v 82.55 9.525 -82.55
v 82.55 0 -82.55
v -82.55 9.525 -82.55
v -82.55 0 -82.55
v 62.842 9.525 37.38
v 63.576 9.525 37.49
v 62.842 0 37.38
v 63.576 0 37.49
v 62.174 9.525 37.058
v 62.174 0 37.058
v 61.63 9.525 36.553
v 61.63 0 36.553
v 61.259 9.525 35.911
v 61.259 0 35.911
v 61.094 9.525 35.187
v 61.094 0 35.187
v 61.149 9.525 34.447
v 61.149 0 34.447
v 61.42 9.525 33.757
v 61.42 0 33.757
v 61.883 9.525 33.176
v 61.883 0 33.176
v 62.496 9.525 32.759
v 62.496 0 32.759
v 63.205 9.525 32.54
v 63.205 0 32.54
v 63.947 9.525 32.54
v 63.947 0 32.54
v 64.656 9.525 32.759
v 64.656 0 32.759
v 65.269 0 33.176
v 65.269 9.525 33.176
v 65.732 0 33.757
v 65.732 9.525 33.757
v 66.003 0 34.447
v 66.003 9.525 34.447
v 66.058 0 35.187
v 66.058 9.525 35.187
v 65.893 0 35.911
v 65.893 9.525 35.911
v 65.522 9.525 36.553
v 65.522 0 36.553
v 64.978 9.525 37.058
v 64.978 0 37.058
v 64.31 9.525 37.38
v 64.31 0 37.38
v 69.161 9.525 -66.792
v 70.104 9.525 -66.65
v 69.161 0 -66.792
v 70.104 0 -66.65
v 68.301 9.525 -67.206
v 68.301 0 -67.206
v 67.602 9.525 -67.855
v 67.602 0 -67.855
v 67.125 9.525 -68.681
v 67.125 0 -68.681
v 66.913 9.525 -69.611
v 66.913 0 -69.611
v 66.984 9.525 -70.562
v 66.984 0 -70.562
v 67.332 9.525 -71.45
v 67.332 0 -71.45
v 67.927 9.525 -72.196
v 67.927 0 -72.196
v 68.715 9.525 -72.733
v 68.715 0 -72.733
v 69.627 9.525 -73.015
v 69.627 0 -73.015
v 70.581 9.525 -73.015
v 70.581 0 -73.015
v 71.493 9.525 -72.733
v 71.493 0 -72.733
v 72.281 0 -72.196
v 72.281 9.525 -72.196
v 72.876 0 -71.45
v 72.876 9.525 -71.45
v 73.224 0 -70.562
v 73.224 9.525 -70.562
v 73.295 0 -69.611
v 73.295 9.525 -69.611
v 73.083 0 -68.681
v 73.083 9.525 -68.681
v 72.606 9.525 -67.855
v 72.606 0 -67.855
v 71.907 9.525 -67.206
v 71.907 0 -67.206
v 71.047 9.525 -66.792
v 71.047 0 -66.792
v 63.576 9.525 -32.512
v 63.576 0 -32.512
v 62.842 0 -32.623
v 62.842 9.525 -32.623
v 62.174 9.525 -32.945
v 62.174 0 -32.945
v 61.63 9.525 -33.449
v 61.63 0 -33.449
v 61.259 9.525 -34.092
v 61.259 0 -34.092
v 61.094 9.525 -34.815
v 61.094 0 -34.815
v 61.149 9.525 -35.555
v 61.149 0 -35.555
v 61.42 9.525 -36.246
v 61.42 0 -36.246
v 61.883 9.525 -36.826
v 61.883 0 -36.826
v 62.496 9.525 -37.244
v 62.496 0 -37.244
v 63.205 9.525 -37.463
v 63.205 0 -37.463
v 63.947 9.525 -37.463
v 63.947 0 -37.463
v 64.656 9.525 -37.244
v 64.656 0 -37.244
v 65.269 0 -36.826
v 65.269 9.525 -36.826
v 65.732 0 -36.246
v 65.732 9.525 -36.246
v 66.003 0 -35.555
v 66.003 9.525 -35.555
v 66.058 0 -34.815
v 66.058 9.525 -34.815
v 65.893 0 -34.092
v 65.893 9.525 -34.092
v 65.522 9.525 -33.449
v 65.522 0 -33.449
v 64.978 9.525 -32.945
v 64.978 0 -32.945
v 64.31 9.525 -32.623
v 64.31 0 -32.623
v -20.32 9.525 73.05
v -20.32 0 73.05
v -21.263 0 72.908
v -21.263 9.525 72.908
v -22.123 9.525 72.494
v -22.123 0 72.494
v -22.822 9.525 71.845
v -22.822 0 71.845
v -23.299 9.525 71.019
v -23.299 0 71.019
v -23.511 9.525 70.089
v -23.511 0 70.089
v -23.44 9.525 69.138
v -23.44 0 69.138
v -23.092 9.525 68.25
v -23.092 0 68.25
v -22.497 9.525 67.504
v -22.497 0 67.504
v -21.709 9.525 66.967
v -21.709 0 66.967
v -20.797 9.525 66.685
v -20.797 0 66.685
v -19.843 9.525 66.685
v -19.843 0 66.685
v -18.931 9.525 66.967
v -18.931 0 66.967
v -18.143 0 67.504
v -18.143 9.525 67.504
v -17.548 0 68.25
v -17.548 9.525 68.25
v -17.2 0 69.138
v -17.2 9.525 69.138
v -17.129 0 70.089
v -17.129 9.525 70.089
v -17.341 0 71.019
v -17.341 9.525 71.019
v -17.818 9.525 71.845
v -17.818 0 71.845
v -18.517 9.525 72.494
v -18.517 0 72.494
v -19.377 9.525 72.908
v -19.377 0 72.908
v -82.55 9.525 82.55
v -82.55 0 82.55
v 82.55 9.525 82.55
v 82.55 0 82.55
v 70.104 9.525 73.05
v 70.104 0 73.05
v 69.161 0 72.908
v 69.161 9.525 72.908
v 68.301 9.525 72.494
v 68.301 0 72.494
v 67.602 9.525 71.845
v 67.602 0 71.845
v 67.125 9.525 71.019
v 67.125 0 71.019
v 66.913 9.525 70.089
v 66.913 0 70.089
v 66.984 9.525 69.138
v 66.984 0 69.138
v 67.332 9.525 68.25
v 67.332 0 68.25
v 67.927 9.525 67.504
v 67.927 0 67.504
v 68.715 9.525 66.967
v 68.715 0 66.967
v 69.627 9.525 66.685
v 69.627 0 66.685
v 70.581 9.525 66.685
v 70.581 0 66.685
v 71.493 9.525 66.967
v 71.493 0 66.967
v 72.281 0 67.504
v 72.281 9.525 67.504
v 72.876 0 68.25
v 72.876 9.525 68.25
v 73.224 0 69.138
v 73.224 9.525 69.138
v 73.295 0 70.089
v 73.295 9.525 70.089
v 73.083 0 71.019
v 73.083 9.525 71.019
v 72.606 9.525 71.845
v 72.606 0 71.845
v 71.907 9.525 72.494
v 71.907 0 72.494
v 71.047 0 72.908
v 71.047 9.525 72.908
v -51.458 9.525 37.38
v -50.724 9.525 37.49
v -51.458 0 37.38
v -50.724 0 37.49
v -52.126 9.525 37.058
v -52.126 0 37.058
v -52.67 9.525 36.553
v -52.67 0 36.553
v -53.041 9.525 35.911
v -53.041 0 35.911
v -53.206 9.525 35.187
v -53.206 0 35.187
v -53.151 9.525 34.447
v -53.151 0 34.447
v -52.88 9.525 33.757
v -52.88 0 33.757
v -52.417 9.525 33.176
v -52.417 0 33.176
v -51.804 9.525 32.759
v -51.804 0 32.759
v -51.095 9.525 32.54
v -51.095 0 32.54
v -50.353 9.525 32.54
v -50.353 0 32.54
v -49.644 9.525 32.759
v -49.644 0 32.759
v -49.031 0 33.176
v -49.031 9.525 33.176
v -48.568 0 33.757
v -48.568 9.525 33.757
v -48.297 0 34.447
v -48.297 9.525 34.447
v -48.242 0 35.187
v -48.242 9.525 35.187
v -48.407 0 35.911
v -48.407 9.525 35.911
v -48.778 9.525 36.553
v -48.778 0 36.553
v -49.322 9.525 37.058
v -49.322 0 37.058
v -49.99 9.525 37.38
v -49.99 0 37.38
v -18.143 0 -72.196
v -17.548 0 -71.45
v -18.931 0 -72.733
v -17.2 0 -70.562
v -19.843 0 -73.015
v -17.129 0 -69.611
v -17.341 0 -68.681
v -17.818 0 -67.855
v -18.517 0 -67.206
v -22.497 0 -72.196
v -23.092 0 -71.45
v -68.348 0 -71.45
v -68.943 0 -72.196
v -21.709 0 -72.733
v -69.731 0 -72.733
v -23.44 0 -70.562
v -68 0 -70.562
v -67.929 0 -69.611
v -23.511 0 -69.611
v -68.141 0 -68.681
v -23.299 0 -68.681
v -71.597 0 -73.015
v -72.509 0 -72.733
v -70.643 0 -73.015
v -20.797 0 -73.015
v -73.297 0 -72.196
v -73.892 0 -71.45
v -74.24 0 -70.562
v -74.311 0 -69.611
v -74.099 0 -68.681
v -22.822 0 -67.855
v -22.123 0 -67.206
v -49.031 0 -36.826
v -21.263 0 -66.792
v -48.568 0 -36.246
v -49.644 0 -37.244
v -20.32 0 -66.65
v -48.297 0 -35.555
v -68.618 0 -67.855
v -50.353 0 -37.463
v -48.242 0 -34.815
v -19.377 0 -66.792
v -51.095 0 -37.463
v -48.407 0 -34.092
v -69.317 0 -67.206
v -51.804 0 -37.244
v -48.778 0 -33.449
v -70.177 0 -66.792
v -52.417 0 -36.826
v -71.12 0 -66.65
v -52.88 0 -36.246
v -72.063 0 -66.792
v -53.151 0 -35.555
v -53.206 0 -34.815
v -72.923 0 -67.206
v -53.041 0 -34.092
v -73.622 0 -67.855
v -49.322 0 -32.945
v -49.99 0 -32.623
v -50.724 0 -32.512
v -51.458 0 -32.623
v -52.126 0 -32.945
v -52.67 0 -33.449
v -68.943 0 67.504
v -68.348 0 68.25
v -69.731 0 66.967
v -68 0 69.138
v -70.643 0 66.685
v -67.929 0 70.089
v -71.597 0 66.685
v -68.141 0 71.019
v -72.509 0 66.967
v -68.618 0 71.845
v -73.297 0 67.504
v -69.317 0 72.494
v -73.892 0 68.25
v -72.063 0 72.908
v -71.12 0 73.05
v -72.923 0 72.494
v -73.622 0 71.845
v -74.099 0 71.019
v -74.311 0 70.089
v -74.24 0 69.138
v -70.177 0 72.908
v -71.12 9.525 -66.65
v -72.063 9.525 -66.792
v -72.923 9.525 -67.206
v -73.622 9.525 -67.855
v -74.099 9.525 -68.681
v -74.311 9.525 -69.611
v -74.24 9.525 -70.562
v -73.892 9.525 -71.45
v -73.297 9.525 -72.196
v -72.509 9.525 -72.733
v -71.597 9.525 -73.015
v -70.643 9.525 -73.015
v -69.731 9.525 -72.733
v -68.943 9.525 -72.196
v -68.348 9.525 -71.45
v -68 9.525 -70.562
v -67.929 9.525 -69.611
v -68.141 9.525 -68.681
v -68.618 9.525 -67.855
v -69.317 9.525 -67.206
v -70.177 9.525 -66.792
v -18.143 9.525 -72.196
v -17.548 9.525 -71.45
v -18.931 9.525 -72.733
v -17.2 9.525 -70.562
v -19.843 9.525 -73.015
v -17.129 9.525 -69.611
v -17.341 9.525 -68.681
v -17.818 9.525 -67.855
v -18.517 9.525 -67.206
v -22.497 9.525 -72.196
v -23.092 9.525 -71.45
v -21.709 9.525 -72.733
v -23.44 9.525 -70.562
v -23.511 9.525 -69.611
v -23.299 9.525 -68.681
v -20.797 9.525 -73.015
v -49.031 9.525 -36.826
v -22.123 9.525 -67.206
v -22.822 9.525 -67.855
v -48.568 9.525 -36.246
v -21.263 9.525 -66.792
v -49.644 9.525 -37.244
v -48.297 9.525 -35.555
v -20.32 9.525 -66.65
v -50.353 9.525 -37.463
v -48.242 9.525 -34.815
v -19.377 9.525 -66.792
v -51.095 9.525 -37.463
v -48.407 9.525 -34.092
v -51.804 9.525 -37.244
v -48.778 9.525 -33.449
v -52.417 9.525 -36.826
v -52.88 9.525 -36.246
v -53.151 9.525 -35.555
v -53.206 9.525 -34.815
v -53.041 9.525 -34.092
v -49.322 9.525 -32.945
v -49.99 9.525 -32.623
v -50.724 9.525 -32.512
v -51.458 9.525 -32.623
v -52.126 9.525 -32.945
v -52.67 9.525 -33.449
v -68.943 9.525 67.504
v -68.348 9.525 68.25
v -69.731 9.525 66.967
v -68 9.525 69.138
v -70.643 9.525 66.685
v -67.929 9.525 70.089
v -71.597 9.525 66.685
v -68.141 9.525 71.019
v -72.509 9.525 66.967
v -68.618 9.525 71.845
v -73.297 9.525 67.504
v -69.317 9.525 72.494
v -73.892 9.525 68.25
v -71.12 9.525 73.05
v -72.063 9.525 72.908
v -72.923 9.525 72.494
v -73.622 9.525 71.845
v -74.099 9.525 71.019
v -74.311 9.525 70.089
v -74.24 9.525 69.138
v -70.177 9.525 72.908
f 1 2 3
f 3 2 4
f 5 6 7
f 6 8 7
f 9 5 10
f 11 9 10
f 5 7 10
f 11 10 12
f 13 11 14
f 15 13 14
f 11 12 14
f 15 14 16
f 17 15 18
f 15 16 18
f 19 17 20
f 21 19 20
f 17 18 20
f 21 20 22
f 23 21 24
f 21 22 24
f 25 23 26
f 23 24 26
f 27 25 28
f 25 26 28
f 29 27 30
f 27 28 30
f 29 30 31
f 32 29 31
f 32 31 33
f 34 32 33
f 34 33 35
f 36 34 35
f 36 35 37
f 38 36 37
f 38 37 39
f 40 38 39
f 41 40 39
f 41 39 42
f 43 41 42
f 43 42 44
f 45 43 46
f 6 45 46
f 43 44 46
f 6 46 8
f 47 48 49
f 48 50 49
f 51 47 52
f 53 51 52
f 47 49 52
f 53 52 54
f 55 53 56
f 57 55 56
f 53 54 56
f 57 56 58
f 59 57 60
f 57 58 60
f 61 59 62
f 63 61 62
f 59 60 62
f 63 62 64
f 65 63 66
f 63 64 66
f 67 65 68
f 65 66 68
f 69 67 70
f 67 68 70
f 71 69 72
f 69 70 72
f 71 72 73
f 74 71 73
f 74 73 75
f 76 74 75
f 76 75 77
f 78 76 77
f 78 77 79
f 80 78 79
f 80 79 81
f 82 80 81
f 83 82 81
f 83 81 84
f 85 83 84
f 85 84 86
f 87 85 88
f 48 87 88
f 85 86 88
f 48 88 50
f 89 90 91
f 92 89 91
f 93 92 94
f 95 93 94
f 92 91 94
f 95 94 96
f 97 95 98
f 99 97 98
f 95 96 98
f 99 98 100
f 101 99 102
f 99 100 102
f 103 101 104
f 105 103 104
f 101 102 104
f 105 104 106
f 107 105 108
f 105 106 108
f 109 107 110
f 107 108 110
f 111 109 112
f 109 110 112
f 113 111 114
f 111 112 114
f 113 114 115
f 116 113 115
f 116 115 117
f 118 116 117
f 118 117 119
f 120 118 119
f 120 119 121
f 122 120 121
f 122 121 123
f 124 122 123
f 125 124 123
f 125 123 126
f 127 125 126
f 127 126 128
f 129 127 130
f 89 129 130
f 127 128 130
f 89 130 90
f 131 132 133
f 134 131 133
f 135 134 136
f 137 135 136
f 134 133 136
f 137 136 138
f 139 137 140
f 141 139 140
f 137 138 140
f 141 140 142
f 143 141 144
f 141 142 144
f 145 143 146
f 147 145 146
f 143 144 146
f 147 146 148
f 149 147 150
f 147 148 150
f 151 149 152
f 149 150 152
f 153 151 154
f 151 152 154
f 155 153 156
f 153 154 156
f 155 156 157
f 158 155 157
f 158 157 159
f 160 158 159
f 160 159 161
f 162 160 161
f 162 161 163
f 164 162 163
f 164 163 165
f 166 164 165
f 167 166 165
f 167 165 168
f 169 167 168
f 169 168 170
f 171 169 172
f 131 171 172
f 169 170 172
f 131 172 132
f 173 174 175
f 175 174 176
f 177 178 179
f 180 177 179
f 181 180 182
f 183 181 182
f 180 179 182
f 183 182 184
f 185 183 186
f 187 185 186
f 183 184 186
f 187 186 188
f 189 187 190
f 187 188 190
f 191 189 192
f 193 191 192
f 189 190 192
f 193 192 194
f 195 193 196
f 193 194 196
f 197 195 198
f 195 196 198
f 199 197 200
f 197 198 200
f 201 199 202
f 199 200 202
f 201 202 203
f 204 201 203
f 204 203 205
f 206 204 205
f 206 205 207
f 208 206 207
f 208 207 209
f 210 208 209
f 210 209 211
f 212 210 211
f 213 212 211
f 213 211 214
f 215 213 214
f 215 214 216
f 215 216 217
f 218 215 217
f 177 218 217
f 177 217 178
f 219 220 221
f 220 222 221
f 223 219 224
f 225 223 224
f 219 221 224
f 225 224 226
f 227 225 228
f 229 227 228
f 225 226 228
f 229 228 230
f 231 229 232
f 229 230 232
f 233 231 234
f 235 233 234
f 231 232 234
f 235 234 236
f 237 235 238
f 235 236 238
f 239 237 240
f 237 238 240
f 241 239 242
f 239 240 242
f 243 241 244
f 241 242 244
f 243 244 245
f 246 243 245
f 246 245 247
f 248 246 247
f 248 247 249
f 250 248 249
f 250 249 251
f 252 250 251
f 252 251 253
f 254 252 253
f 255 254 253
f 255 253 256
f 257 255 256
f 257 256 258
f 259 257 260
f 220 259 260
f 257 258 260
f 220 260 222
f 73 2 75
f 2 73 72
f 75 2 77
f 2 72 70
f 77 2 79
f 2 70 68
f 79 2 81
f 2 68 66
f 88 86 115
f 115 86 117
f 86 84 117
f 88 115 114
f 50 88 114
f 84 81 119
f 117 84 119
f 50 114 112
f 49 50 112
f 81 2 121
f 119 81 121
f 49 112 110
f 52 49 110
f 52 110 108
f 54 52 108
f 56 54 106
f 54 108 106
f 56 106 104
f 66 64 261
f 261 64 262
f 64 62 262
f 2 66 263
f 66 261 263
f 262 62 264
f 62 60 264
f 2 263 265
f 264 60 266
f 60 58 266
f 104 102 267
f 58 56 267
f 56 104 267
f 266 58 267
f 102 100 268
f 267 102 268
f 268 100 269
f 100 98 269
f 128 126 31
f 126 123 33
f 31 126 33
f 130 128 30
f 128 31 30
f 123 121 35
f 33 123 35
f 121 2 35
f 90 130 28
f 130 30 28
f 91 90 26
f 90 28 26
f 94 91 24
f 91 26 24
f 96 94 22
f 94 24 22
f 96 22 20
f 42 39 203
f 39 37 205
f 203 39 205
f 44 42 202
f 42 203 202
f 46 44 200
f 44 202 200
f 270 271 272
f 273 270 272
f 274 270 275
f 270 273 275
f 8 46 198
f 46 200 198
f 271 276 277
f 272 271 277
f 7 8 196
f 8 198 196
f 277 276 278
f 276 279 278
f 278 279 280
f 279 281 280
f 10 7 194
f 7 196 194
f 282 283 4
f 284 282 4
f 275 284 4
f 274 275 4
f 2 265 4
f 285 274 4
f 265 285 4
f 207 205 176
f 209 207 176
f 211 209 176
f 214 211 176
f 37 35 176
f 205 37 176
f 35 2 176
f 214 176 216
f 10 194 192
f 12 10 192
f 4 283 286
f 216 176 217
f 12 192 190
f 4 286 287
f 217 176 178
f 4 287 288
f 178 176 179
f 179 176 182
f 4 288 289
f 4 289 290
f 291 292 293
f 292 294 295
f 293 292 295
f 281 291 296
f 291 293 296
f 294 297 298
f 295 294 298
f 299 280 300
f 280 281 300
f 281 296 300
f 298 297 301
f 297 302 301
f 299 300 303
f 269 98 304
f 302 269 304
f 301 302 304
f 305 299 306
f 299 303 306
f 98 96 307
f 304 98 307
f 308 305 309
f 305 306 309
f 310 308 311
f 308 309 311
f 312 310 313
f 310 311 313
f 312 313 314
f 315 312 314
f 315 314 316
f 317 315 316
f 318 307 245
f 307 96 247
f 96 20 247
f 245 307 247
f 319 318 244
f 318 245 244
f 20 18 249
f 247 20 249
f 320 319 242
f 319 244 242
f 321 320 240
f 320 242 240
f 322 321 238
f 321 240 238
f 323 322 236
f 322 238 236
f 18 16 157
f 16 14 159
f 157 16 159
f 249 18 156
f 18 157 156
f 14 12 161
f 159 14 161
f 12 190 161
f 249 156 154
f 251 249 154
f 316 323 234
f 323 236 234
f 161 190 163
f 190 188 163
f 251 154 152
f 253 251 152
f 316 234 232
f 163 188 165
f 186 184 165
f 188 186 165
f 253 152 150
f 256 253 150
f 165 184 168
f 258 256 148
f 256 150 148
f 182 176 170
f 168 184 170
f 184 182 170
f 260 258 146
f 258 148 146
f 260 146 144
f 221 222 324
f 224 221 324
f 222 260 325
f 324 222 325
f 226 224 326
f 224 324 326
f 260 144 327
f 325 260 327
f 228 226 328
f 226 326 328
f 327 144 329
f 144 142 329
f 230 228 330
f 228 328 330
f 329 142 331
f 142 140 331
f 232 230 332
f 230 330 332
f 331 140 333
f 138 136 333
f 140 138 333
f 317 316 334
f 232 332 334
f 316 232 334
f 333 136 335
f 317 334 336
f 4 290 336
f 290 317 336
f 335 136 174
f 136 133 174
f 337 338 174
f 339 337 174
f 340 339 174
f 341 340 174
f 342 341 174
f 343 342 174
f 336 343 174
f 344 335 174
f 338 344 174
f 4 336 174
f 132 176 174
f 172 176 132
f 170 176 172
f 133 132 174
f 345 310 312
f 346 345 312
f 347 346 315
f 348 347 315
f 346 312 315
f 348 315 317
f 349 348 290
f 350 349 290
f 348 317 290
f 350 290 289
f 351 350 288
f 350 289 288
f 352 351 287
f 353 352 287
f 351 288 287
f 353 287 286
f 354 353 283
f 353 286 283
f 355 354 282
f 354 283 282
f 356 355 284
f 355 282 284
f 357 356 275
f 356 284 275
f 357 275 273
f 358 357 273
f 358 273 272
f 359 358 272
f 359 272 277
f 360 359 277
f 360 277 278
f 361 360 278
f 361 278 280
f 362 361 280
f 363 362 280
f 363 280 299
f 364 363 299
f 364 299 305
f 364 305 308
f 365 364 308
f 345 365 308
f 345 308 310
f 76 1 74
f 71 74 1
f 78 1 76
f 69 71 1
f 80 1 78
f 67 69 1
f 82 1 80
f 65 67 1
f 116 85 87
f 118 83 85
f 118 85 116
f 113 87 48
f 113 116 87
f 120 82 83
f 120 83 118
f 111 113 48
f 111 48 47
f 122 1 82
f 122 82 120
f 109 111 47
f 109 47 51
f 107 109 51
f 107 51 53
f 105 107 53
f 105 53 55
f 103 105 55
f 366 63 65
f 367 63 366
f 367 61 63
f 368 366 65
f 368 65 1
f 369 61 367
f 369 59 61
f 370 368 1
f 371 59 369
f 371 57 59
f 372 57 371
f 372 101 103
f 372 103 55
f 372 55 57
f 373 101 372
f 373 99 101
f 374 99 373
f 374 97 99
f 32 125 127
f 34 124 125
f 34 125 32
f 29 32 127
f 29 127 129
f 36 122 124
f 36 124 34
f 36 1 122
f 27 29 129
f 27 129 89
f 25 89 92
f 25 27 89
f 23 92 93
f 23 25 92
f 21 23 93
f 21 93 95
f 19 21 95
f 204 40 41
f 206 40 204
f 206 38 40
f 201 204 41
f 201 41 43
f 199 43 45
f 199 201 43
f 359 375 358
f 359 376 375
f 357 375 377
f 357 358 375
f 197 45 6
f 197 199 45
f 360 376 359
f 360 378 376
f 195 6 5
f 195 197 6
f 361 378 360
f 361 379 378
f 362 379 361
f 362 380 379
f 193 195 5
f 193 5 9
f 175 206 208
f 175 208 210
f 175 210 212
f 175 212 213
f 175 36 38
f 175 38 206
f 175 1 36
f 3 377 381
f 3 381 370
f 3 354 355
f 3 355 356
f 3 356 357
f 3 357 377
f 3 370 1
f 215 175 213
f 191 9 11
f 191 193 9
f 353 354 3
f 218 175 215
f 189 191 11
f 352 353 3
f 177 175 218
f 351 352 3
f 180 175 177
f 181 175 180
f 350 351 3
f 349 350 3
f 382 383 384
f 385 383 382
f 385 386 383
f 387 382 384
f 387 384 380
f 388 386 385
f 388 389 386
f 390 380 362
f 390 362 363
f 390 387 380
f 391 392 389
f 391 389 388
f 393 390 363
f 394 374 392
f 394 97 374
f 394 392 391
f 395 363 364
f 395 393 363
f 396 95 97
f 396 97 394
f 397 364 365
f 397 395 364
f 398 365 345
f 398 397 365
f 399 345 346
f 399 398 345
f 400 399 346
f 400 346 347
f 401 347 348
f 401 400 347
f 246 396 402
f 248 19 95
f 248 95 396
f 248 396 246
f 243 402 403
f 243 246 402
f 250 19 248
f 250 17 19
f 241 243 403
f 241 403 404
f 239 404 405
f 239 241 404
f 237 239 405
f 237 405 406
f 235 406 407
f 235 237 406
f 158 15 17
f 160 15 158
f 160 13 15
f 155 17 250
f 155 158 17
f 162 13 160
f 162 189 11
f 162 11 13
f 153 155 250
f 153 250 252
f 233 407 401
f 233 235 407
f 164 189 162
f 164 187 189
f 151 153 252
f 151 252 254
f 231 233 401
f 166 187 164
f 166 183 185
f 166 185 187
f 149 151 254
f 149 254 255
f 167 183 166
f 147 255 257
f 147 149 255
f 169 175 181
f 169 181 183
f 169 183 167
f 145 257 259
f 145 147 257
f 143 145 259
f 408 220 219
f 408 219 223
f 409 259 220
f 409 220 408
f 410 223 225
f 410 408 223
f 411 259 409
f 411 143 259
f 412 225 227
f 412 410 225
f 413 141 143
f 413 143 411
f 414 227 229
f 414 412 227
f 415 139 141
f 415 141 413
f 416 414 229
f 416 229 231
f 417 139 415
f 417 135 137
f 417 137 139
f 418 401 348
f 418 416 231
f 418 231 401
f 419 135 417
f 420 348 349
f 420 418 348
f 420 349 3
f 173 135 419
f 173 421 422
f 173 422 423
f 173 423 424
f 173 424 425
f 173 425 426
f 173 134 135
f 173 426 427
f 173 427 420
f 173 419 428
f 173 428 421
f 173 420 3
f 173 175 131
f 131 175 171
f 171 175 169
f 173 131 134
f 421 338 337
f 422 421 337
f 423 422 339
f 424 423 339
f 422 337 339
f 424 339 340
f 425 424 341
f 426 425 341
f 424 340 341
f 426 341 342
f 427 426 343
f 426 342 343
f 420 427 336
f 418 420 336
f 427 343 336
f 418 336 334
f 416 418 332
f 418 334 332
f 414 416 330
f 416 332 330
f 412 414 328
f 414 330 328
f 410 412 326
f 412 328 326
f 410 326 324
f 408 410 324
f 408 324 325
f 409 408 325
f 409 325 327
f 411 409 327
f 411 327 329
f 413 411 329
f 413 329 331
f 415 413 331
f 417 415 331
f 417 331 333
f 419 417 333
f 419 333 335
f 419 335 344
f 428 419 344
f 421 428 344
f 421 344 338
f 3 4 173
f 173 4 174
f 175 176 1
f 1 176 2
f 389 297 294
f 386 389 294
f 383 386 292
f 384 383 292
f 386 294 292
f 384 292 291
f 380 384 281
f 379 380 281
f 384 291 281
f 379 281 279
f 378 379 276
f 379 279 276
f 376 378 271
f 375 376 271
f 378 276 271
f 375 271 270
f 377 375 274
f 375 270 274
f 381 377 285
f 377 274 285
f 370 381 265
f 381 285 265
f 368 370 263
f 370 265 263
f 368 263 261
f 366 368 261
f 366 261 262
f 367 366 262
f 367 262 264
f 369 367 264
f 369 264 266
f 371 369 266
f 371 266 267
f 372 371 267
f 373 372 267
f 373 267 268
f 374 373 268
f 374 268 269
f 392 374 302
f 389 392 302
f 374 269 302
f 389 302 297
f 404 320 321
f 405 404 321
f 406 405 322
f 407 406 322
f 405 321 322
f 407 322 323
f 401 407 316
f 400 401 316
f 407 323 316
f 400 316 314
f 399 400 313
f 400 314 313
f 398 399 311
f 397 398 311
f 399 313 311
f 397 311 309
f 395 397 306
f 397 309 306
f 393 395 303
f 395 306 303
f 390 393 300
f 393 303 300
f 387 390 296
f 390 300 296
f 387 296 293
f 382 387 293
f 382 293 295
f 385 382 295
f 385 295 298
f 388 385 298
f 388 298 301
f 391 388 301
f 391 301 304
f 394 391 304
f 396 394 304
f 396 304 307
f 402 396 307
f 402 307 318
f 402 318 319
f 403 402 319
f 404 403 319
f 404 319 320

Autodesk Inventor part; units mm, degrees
ref_plane "YZ Plane" through (0, 0, 0) normal (1, 0, 0) x (0, 1, 0)
ref_plane "XZ Plane" through (0, 0, 0) normal (0, 1, 0) x (-1, 0, 0)
ref_plane "XY Plane" through (0, 0, 0) normal (0, 0, 1) x (1, 0, 0)
sketch "Sketch2" plane through (0, 0, 0) normal (0, 1, 0) x (-1, 0, 0)
  line L0 (82.55, 82.55) -> (-82.55, 82.55)
  line L1 (-82.55, 82.55) -> (-82.55, -82.55)
  line L2 (-82.55, -82.55) -> (82.55, -82.55)
  line L3 (82.55, -82.55) -> (82.55, 82.55)
  point P0 (0, 0)
  point P1 (82.55, 0)
  point P2 (0, -82.55)
  dimension "d0" = 165.1
  dimension "d1" = 165.1
extrude "Extrusion1" add sketch "Sketch2" along normal blind 9.525
sketch "Sketch3" plane through (0, 9.525, 0) normal (0, 1, 0) x (1, 0, 0)
  line L0 (-82.55, 82.55) -> (-82.55, -82.55) projected
  line L1 (82.55, 82.55) -> (-82.55, 82.55) projected
  line L2 (115.57, 0) -> (-115.57, 0) projected
  point P0 (0, 0)
  point P1 (-71.12, 69.85)
  point P2 (-20.32, 69.85)
  point P3 (70.104, 69.85)
  point P4 (-71.12, -69.85)
  point P5 (-20.32, -69.85)
  point P6 (70.104, -69.85)
  dimension "d4" = 11.43
  dimension "d5" = 50.8
  dimension "d6" = 90.424
  dimension "d7" = 12.7
hole "Hole1" at (-71.12, 9.525, -69.85) at (-20.32, 9.525, -69.85) at (70.104, 9.525, -69.85) at (-71.12, 9.525, 69.85) at (-20.32, 9.525, 69.85) at (70.104, 9.525, 69.85) direction (0, -1, 0) diameter 6.4008 end through all thread size "5/16-18 UNC" class "2B" standard "ANSI Unified Screw Threads"
sketch "Sketch4" plane through (0, 9.525, 0) normal (0, 1, 0) x (1, 0, 0)
  circle A0 centre (-20.32, -69.85) radius 3.2004 projected
  circle A1 centre (70.104, 69.85) radius 3.2004 projected
  circle A2 centre (-71.12, 69.85) radius 3.2004 projected
  circle A3 centre (-20.32, 69.85) radius 3.2004 projected
  circle A4 centre (-71.12, -69.85) radius 3.2004 projected
  circle A5 centre (70.104, -69.85) radius 3.2004 projected
  line L0 (-82.55, -82.55) -> (82.55, -82.55) projected
  line L1 (82.55, -82.55) -> (82.55, 82.55) projected
  line L2 (82.55, 82.55) -> (-82.55, 82.55) projected
  line L3 (-82.55, 82.55) -> (-82.55, -82.55) projected
  line L4 (-115.57, 0) -> (115.57, 0) projected
  point P0 (0, 0)
  point P1 (-50.7238, 35.0012)
  point P2 (63.5762, 35.0012)
  point P3 (-50.7238, -35.0012)
  point P4 (63.5762, -35.0012)
  dimension "d15" = 31.8262
  dimension "d16" = 114.3
  dimension "d17" = 47.5488
hole "Hole2" at (-50.7238, 9.525, -35.0012) at (63.5762, 9.525, -35.0012) at (-50.7238, 9.525, 35.0012) at (63.5762, 9.525, 35.0012) direction (0, -1, 0) diameter 4.9784 end through all thread size "1/4-20 UNC" class "2B" standard "ANSI Unified Screw Threads"
properties part number "Motor Shim"
